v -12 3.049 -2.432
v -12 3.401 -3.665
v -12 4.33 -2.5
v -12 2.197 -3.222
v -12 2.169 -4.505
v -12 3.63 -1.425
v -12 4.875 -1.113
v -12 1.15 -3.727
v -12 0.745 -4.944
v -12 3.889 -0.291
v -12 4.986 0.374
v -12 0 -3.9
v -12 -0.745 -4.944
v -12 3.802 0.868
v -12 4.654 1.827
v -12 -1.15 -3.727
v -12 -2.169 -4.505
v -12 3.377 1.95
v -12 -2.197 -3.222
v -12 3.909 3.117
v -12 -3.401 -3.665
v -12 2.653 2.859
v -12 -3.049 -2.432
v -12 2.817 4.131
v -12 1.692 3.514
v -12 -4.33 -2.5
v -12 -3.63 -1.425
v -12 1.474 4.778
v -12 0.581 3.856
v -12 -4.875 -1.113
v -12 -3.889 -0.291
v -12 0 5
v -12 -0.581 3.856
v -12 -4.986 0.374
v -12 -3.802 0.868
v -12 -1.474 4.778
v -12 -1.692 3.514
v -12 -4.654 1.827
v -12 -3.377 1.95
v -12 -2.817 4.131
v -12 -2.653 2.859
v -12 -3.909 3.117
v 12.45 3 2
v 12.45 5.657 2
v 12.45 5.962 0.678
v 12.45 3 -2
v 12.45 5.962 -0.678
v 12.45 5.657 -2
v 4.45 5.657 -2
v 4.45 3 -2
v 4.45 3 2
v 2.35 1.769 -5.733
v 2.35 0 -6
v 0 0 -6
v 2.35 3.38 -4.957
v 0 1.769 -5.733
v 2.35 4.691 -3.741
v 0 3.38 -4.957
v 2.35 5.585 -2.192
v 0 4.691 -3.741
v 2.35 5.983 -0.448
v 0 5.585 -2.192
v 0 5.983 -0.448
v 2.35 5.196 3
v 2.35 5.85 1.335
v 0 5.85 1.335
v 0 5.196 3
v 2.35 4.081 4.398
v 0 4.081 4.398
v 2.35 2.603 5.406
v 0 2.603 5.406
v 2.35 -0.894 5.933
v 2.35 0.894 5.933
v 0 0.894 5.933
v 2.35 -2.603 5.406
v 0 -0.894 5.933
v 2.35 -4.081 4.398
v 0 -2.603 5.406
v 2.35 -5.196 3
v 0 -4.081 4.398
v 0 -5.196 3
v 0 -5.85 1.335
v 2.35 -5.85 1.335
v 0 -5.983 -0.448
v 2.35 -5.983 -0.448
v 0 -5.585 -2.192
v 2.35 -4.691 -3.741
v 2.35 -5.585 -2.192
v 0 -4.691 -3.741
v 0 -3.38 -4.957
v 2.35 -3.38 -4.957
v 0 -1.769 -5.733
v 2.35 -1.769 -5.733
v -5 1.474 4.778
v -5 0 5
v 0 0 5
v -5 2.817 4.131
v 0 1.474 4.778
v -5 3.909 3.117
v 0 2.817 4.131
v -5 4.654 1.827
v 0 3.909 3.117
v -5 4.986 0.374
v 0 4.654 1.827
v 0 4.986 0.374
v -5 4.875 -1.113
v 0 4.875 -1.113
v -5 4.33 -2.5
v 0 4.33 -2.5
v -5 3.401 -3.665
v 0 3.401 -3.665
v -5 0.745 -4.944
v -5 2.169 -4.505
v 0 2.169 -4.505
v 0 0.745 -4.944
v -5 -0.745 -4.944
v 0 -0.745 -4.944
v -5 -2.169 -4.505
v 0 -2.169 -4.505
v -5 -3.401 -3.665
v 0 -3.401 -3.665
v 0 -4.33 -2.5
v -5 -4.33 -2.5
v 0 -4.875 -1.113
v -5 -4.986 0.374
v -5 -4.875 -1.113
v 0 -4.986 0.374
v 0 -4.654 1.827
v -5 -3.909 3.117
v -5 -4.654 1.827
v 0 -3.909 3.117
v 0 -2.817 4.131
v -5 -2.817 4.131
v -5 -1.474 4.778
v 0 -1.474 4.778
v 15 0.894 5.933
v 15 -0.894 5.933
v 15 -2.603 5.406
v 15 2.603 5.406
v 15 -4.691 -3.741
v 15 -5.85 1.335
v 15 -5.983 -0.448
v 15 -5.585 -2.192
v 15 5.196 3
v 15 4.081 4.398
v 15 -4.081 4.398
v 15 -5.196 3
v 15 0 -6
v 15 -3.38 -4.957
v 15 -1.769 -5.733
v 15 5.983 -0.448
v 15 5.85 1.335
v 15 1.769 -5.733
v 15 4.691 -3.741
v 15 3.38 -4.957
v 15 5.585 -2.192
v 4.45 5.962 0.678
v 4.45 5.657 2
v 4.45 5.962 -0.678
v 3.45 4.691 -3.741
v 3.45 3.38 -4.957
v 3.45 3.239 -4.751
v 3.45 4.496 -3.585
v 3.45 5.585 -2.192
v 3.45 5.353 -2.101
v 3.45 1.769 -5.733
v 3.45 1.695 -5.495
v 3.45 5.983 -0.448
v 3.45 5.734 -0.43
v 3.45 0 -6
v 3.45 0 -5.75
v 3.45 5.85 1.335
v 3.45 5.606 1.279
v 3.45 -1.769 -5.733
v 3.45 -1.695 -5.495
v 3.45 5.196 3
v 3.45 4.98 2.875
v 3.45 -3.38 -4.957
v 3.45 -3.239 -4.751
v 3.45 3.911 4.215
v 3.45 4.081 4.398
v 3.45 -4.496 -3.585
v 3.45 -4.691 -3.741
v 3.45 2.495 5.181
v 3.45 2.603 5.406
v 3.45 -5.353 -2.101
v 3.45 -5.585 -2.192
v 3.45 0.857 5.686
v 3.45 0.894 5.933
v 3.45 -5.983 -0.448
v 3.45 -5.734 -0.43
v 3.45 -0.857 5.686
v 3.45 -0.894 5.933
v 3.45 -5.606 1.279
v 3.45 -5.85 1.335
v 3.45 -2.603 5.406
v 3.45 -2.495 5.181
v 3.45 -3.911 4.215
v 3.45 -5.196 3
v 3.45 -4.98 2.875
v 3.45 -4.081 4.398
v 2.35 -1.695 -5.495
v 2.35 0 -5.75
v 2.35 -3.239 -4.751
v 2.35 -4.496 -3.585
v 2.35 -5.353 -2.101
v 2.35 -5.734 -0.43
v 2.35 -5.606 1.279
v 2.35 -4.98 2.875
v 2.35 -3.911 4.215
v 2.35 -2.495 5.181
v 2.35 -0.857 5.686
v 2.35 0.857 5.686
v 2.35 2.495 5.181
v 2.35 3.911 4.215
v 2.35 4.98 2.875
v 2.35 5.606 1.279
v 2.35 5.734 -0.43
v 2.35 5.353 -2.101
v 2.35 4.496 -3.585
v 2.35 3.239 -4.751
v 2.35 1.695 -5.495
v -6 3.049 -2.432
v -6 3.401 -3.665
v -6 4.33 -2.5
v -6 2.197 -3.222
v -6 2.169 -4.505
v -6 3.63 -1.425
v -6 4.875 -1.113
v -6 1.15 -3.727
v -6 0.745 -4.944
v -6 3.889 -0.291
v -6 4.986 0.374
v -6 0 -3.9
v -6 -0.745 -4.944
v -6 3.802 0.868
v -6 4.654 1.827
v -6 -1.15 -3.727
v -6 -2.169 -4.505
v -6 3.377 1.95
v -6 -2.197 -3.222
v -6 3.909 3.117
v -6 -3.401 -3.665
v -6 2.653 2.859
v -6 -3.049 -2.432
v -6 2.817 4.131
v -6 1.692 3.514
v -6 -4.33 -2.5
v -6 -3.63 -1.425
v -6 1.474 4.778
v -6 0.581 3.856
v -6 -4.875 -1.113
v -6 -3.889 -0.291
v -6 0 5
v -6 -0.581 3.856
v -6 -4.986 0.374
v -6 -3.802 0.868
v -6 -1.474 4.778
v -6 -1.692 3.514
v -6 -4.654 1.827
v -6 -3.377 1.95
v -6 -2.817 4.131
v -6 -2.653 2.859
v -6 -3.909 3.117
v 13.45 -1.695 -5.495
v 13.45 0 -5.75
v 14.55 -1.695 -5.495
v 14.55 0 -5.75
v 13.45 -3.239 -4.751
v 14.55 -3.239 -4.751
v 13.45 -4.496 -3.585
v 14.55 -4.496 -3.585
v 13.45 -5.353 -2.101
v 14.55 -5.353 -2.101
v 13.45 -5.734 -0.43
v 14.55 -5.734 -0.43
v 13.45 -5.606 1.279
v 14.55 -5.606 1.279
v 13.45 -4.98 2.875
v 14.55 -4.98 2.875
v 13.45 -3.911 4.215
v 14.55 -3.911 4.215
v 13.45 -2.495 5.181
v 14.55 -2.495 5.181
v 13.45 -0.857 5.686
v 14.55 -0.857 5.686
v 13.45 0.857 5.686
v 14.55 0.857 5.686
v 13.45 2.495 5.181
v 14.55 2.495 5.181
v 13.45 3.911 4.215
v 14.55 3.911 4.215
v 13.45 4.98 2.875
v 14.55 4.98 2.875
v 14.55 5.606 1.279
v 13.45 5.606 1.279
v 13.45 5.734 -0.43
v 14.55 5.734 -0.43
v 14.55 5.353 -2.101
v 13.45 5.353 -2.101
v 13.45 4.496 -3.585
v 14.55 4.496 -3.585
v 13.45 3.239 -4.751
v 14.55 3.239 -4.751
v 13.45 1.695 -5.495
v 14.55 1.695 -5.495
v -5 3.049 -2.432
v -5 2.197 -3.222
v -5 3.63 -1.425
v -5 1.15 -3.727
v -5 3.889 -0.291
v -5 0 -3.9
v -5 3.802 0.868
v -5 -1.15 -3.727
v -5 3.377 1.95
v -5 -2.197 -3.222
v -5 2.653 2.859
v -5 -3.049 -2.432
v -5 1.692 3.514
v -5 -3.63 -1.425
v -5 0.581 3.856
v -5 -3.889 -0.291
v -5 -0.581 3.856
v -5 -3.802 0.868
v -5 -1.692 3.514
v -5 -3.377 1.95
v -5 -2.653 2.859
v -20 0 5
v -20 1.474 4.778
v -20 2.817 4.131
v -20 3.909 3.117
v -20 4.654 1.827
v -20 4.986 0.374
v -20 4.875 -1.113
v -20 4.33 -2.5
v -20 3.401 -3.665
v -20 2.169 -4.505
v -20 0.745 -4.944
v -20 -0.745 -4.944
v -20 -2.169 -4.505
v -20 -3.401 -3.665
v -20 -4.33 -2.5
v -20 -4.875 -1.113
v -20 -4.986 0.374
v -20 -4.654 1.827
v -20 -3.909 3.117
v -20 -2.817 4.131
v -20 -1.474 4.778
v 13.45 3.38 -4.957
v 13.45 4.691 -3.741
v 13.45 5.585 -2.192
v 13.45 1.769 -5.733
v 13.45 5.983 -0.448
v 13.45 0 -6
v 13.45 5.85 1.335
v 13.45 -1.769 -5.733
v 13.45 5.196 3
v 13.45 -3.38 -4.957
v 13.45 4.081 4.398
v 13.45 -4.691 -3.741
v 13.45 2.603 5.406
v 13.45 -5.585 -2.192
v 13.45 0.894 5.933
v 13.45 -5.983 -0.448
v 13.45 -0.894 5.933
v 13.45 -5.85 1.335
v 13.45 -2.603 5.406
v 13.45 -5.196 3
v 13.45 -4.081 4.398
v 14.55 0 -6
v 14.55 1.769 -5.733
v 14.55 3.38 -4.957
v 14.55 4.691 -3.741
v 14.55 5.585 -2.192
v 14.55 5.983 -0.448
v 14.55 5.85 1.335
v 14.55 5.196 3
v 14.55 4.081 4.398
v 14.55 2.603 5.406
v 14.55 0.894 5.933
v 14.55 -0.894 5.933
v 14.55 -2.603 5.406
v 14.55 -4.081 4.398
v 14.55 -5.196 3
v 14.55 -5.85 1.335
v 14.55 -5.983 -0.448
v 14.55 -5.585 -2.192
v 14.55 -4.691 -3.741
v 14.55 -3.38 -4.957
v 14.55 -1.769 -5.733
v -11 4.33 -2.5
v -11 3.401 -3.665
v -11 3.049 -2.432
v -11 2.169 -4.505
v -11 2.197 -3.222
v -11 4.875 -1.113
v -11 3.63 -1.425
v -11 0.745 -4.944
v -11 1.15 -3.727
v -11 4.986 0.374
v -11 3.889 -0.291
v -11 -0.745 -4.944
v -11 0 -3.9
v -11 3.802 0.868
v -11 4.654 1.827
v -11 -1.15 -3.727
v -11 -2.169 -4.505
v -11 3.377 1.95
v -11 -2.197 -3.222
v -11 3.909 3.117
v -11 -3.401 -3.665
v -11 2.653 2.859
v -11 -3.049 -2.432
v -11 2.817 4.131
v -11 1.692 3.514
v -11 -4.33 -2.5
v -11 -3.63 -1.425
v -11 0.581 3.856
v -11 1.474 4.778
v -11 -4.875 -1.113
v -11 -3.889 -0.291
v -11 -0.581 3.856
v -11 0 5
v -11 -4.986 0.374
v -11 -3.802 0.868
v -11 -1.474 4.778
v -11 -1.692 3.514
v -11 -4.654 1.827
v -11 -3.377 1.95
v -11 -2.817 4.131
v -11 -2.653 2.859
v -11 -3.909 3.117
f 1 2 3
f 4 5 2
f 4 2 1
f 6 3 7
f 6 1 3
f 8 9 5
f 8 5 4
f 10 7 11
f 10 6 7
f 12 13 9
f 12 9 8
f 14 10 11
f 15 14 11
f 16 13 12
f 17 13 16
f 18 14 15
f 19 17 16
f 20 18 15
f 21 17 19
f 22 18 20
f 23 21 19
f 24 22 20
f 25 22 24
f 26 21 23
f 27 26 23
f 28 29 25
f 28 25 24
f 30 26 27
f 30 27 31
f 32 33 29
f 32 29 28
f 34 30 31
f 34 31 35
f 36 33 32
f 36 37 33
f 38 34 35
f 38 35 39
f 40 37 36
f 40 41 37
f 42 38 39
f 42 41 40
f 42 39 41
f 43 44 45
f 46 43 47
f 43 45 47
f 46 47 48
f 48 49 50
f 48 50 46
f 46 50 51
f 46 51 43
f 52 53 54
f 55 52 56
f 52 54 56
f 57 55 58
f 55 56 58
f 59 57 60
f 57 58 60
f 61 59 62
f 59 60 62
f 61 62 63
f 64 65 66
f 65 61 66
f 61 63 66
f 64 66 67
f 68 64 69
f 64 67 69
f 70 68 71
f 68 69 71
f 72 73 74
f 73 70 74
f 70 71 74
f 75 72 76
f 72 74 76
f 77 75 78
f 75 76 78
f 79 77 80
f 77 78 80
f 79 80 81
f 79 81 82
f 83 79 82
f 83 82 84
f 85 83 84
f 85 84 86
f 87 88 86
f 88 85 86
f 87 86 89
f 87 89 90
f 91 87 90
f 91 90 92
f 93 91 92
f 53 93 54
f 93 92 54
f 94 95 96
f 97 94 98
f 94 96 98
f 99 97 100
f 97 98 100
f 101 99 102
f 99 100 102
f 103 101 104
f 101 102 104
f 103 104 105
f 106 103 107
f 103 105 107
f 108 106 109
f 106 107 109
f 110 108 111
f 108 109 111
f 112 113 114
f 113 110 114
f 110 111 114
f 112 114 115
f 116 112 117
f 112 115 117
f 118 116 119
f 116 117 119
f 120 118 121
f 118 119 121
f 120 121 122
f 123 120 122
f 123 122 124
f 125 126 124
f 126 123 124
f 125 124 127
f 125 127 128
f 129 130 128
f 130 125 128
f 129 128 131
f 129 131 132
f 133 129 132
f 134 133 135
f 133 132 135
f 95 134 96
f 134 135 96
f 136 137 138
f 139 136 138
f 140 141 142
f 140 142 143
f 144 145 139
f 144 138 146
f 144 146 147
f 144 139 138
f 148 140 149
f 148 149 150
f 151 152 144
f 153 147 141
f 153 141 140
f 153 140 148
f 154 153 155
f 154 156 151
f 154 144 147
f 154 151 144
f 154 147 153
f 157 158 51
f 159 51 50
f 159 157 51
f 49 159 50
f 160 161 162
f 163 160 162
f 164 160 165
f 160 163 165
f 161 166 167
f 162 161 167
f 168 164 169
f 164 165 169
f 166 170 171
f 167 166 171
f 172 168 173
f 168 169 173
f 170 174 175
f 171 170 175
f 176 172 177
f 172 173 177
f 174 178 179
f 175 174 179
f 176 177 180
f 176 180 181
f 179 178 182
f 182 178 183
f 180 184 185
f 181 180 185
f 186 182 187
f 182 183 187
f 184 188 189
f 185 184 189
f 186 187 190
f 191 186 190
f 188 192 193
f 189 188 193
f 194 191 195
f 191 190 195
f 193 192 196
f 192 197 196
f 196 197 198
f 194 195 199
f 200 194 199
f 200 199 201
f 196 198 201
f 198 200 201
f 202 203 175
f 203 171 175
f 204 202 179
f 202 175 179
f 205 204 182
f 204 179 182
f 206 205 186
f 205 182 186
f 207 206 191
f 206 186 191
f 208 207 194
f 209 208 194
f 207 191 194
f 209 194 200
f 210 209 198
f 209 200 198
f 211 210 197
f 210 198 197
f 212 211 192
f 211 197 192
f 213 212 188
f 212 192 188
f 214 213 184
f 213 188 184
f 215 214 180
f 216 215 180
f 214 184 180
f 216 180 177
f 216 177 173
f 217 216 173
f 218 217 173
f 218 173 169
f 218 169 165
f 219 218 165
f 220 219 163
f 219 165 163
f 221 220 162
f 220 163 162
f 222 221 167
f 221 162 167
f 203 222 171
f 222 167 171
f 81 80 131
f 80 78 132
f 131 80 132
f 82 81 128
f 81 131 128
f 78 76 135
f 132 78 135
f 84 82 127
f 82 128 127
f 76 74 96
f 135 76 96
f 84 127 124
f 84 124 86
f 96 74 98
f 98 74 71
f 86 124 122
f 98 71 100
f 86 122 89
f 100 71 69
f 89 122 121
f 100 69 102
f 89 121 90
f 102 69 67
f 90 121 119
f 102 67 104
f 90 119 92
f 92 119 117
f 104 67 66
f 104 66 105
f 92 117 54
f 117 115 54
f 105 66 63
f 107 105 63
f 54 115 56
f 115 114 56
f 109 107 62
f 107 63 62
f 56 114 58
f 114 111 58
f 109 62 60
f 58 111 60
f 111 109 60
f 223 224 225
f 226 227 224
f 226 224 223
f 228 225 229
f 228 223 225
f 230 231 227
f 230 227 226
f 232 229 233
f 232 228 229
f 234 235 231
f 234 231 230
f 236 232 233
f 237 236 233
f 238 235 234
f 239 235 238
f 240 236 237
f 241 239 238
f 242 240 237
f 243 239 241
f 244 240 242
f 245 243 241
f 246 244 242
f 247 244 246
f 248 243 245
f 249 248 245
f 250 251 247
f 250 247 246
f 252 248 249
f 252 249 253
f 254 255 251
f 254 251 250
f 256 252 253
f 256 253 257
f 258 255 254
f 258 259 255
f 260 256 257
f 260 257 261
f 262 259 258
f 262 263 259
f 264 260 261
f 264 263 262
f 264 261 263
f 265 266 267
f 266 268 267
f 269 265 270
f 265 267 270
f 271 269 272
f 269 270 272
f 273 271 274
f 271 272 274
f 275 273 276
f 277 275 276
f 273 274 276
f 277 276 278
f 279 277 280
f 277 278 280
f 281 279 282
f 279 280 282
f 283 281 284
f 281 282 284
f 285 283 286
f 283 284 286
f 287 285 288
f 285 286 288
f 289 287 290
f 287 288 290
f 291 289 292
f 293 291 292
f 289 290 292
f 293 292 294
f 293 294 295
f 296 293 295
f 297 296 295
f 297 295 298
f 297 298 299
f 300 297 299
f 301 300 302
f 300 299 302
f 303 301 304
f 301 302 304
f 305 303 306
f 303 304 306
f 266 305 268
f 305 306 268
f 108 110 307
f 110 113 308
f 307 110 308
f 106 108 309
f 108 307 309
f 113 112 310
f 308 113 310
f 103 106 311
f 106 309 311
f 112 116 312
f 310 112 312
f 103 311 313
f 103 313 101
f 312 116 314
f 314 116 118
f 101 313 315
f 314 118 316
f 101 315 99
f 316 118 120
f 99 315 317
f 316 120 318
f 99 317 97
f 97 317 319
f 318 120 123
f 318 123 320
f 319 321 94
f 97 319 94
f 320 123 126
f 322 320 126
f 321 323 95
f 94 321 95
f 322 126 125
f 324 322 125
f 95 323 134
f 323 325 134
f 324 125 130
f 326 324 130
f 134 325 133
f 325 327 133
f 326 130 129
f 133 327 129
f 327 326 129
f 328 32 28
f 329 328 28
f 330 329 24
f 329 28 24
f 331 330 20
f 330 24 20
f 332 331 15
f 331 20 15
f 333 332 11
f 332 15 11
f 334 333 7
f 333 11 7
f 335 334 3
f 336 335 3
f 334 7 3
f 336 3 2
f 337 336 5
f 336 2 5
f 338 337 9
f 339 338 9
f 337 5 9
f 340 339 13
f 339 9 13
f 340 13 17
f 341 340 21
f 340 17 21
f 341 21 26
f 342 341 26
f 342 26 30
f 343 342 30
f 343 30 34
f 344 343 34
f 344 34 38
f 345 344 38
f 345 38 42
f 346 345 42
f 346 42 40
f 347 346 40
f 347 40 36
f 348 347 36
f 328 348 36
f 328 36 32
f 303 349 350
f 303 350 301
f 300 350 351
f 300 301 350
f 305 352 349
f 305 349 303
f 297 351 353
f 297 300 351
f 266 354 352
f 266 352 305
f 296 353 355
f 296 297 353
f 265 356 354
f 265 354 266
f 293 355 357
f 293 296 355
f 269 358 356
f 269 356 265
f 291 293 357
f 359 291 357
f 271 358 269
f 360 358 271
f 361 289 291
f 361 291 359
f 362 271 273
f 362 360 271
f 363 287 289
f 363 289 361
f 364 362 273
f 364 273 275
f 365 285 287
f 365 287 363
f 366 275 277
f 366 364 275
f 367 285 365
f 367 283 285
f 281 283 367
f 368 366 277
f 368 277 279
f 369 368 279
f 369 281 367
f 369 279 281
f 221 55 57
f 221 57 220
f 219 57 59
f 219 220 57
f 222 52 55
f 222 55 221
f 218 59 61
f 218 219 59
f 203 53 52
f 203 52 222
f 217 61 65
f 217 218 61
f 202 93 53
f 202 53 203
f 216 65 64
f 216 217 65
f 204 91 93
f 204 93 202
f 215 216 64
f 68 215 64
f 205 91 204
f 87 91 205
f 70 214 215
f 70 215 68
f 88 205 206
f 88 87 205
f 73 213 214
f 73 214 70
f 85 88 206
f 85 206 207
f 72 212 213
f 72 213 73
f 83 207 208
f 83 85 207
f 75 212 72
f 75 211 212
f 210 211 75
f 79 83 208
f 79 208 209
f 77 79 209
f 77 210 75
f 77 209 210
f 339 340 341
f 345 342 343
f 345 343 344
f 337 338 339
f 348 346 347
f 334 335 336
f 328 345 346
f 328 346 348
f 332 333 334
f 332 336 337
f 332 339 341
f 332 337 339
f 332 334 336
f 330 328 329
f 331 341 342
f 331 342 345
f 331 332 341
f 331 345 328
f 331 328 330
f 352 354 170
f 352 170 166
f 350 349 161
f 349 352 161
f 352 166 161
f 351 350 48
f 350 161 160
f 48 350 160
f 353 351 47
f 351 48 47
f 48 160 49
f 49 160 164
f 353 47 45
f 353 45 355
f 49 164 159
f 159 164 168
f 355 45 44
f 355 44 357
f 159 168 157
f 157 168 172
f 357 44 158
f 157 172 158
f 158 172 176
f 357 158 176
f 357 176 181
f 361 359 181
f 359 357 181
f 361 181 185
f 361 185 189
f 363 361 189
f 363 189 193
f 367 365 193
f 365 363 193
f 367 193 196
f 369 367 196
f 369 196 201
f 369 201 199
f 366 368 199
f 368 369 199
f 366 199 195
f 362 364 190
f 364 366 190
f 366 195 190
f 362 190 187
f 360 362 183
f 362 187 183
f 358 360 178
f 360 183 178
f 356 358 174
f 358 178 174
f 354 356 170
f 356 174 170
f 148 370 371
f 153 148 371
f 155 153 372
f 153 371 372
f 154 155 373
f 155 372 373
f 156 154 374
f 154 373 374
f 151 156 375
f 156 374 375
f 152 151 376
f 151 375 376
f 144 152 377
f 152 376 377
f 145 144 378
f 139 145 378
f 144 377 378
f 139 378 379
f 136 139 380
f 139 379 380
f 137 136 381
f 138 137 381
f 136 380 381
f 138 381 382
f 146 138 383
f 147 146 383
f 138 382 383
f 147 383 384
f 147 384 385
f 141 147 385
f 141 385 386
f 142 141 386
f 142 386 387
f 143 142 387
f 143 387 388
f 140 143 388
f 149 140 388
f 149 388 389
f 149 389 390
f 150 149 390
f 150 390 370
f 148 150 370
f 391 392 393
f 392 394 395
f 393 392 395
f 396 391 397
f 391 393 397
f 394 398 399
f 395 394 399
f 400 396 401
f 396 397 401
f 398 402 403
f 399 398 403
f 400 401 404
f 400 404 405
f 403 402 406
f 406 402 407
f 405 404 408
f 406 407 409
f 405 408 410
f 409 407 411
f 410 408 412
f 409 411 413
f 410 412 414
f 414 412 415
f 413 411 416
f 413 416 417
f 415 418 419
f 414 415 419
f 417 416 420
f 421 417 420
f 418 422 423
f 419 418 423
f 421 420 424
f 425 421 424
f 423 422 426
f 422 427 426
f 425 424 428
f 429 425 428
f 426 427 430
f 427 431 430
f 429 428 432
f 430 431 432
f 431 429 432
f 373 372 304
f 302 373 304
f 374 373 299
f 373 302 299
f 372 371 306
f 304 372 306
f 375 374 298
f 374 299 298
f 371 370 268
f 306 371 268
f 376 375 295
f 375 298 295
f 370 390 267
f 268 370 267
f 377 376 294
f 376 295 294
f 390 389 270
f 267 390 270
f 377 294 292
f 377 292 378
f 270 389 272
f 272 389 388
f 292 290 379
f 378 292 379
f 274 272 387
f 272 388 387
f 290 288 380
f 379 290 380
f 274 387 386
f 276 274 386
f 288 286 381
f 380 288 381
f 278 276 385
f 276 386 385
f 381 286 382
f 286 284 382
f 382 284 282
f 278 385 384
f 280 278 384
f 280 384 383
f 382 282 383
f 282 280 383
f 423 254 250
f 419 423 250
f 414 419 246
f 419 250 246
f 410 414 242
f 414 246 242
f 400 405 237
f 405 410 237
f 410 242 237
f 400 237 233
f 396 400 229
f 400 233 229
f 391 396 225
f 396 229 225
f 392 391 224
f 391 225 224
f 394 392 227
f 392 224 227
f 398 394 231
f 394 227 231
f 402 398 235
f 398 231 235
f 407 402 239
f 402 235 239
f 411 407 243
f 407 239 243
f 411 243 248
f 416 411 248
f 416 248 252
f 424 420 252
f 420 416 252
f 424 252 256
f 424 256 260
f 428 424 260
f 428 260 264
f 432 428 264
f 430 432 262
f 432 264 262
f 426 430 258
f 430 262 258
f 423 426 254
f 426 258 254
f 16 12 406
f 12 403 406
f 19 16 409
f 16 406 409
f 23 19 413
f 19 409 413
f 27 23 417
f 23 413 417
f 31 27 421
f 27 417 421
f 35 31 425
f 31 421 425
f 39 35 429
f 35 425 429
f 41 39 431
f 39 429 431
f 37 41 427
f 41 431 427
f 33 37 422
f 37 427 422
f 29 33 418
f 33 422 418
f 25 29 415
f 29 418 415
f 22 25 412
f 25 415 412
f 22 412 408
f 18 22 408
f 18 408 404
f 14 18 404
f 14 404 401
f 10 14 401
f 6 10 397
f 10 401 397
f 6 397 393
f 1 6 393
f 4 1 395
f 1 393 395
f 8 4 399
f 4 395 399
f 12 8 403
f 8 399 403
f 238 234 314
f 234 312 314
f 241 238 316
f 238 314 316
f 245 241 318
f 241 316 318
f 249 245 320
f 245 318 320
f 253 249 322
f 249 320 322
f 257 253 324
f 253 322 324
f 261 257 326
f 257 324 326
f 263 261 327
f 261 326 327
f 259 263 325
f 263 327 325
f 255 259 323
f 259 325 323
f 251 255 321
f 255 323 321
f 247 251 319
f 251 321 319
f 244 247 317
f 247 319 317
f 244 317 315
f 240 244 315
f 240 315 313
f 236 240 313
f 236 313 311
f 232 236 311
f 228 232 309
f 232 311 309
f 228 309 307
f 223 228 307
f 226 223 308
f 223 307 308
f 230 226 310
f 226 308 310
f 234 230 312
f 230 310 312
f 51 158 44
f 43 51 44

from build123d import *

# Parameters (mm, degrees)
SKETCH1_R           = 6
BOSS_EXTRUDE1_DEPTH = 15
SKETCH2_R           = 5
BOSS_EXTRUDE2_DEPTH = 20
SKETCH3_W           = 8
SKETCH3_H           = 4
CUT_EXTRUDE1_DEPTH  = 3
SKETCH4_W           = 1
SKETCH4_H           = 1.1
SKETCH4_W_2         = 1.1
SKETCH4_H_2         = 0.25


with BuildPart() as part:
    # Sketch1 → Boss-Extrude1 (new body)
    with BuildSketch(Plane(origin=(0, 0, 0), x_dir=(0, 0, -1), z_dir=(1, 0, 0))):
        Circle(SKETCH1_R)
    extrude(amount=BOSS_EXTRUDE1_DEPTH)

    # Sketch2 → Boss-Extrude2 (add)
    with BuildSketch(Plane.ZY):
        Circle(SKETCH2_R)
    extrude(amount=BOSS_EXTRUDE2_DEPTH)

    # Sketch3 → Cut-Extrude1 (cut)
    with BuildSketch(Plane(origin=(0, 6, 0), x_dir=(1, 0, 0), z_dir=(0, 1, 0))):
        with Locations((8.45, 0)):
            Rectangle(SKETCH3_W, SKETCH3_H)
    extrude(amount=-CUT_EXTRUDE1_DEPTH, mode=Mode.SUBTRACT)

    # Sketch4 → Cut-Revolve1 (revolve, cut)
    with BuildSketch(Plane.XY, mode=Mode.PRIVATE) as cut_revolve1_sk:
        with Locations((-5.5, 4.45)):
            Rectangle(SKETCH4_W, SKETCH4_H)
        with Locations((-11.5, 4.45)):
            Rectangle(SKETCH4_W, SKETCH4_H)
        with Locations((2.9, 5.875)):
            Rectangle(SKETCH4_W_2, SKETCH4_H_2)
        with Locations((14, 5.875)):
            Rectangle(SKETCH4_W_2, SKETCH4_H_2)
    revolve(cut_revolve1_sk.sketch.rotate(Axis((0, 0, 0), (-1, 0, 0)), 90), axis=Axis((0, 0, 0), (-1, 0, 0)), mode=Mode.SUBTRACT)


solid = part.part
